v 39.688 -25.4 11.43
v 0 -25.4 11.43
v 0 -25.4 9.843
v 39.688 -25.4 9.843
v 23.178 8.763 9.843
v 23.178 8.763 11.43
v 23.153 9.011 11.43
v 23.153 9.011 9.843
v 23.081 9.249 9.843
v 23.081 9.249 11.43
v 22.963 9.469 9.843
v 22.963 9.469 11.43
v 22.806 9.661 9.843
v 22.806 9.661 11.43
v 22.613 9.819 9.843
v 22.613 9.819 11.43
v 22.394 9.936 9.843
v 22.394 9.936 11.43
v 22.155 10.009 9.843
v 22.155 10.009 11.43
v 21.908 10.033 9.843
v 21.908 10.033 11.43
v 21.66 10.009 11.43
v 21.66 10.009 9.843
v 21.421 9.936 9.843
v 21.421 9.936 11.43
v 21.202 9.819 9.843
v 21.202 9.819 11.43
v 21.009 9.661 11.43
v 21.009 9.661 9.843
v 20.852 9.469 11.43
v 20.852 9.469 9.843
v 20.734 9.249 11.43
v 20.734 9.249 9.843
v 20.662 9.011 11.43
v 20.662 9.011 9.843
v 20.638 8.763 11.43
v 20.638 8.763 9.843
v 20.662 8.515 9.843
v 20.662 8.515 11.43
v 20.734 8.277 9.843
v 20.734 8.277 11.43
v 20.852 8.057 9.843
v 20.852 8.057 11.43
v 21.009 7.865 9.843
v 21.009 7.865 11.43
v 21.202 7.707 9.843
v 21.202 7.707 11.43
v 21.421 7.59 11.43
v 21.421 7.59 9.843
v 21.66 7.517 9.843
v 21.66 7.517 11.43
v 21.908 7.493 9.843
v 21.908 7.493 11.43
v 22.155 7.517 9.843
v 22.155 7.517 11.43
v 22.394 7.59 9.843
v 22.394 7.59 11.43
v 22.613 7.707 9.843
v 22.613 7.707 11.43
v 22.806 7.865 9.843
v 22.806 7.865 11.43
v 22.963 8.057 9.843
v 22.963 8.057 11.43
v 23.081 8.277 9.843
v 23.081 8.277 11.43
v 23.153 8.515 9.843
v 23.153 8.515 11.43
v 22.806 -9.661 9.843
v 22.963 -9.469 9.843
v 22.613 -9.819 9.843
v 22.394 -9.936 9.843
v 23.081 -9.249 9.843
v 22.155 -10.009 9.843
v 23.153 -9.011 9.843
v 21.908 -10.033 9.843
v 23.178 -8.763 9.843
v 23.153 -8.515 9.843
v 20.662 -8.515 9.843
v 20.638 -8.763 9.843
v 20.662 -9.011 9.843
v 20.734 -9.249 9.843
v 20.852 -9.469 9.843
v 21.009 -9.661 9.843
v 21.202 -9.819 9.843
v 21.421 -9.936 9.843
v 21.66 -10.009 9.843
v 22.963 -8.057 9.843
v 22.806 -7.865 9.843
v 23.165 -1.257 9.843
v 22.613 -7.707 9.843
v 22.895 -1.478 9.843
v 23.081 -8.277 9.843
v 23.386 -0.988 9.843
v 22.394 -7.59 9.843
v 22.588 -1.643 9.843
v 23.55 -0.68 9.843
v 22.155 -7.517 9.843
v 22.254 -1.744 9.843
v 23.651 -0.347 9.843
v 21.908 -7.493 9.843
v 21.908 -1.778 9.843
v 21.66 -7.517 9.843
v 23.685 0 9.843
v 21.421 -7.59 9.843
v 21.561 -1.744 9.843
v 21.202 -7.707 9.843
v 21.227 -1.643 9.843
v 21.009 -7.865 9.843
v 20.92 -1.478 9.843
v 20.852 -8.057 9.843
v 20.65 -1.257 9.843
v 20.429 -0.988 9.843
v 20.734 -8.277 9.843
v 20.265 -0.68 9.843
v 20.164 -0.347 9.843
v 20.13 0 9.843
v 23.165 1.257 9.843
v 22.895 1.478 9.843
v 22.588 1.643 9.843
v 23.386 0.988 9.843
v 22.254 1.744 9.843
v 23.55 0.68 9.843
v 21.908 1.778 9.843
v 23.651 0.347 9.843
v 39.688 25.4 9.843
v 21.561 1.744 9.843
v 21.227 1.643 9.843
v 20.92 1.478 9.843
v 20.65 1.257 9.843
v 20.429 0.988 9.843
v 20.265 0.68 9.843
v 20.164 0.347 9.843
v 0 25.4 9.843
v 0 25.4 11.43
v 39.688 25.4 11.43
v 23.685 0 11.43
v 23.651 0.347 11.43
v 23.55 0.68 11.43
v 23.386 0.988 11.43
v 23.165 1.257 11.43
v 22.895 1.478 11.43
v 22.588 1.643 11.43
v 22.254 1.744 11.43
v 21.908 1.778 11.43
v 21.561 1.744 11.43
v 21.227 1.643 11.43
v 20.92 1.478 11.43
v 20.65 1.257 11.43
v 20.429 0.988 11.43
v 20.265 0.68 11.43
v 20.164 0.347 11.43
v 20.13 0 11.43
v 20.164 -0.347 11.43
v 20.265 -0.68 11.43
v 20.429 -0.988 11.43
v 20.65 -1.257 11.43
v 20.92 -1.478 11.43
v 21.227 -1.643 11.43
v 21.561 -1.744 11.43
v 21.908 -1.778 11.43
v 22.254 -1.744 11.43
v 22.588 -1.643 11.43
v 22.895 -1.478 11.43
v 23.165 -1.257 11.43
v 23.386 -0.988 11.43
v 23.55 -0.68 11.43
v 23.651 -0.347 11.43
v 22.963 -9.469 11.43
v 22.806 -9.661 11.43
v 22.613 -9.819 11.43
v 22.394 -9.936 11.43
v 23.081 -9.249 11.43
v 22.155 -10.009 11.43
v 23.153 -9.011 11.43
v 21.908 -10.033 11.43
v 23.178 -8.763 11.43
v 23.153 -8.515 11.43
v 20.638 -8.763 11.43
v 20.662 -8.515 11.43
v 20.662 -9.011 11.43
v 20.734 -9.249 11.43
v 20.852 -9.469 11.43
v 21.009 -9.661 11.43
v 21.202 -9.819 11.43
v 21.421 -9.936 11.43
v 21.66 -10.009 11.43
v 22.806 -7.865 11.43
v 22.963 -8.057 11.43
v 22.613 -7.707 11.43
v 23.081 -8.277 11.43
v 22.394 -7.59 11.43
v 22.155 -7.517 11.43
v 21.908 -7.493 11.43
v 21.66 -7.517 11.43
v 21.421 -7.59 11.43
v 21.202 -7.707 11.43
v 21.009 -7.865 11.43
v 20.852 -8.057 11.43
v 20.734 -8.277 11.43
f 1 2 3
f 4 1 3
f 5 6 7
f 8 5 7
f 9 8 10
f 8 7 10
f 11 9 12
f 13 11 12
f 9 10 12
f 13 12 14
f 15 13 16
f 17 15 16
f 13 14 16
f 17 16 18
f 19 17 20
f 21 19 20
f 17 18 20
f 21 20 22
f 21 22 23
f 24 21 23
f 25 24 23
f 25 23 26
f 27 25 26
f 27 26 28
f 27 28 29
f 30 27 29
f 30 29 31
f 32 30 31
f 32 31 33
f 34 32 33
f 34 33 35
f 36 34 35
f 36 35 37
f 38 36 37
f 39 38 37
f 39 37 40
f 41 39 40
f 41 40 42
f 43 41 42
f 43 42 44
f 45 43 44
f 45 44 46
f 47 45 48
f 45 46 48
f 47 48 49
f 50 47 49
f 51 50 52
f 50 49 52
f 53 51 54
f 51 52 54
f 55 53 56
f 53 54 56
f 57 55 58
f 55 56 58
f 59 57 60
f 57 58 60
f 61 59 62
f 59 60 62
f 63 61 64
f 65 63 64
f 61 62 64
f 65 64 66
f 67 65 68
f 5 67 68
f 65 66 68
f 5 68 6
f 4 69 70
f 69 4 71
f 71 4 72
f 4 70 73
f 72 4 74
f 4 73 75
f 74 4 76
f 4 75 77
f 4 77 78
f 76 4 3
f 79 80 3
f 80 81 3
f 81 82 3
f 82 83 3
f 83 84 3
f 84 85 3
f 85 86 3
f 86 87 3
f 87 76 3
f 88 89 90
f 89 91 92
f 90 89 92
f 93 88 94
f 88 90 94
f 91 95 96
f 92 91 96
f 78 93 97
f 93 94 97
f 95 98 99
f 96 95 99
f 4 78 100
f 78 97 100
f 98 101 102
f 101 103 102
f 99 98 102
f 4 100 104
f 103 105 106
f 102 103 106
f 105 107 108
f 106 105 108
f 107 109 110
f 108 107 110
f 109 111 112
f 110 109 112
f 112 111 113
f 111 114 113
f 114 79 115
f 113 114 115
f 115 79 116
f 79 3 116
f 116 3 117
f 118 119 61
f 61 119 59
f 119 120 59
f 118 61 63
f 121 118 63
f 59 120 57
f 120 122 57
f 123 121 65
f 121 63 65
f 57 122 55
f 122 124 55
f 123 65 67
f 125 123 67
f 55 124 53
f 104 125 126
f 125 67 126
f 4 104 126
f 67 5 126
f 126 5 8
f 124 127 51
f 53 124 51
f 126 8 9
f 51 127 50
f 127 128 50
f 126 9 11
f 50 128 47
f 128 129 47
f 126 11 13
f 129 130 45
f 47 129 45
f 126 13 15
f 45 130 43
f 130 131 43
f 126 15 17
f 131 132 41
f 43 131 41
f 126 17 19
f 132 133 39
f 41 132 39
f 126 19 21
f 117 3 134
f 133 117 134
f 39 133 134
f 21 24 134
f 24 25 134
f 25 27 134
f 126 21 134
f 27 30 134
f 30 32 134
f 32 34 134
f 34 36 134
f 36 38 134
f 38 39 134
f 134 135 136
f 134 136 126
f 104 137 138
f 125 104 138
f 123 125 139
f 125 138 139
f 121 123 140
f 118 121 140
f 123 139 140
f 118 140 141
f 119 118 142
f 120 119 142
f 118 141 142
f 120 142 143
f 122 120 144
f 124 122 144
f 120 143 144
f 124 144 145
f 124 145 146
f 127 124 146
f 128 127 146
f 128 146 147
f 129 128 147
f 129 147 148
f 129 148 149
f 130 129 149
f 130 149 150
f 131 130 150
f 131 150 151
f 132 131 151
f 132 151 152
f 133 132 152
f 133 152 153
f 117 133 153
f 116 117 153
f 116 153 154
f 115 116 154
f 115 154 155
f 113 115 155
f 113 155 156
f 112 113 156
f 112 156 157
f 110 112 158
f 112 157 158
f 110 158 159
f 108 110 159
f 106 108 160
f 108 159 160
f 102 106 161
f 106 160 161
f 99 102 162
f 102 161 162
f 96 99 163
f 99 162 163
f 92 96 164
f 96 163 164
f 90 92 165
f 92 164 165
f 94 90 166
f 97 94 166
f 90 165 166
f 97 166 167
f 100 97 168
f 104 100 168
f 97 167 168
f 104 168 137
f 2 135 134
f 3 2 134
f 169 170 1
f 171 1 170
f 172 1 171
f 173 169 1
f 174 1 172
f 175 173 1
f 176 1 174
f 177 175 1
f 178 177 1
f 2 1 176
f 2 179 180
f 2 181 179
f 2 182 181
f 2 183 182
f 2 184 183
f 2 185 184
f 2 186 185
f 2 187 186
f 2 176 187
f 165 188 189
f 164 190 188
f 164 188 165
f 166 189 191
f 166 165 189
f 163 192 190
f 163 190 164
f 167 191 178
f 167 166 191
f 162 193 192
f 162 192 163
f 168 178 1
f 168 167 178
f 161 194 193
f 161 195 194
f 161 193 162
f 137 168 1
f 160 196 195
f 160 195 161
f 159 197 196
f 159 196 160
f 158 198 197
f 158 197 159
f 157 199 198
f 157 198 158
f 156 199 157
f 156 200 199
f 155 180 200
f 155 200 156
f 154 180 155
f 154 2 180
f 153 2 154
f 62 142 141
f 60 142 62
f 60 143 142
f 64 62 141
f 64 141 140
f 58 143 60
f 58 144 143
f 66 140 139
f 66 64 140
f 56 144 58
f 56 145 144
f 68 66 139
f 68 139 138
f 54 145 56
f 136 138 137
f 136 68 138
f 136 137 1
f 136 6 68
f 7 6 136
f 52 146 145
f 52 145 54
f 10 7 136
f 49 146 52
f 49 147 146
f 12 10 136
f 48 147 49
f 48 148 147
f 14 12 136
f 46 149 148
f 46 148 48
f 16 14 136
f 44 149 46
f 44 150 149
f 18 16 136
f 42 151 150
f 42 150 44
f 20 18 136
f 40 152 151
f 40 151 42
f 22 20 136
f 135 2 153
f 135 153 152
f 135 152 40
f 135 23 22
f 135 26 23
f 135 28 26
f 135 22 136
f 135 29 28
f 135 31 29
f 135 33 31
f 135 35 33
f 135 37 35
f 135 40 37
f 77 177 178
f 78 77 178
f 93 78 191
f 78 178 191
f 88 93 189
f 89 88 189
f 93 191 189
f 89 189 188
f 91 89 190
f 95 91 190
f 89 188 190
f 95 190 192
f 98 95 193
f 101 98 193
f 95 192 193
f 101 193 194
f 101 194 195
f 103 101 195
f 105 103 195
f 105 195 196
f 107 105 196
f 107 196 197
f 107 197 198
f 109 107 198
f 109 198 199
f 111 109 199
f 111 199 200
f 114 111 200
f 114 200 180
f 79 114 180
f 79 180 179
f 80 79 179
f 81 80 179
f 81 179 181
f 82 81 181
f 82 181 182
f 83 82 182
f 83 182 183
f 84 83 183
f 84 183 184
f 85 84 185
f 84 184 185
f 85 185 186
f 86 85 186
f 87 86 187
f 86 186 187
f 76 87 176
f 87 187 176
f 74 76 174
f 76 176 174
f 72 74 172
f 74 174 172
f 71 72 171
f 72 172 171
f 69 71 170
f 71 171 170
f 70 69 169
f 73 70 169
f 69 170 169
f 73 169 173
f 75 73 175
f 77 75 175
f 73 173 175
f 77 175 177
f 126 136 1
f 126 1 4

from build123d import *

# Parameters (mm, degrees)
SKETCH2_W           = 22.86
SKETCH2_H           = 50.8
BOSS_EXTRUDE1_DEPTH = 1.5875
SKETCH3_W           = 1.5875
SKETCH3_H           = 50.8
BOSS_EXTRUDE2_DEPTH = 38.1
CUT_EXTRUDE1_REACH  = 54.372
SKETCH4_R           = 1.778
SKETCH4_R_2         = 1.27


with BuildPart() as part:
    # Sketch2 → Boss-Extrude1 (new body)
    with BuildSketch(Plane(origin=(0, 0, 0), x_dir=(0, 0, -1), z_dir=(1, 0, 0))):
        Rectangle(SKETCH2_W, SKETCH2_H)
    extrude(amount=BOSS_EXTRUDE1_DEPTH)

    # Sketch3 → Boss-Extrude2 (add)
    with BuildSketch(Plane(origin=(1.5875, 0, 0), x_dir=(0, 0, -1), z_dir=(1, 0, 0))):
        with Locations((-10.63625, 0)):
            Rectangle(SKETCH3_W, SKETCH3_H)
    extrude(amount=BOSS_EXTRUDE2_DEPTH)

    # Sketch4 → Cut-Extrude1 (cut, up to next)
    with BuildSketch(Plane.XY.offset(11.43), mode=Mode.PRIVATE) as cut_extrude1_sk1:
        with Locations((21.9075, 0)):
            Circle(SKETCH4_R)
    cut_extrude1_tool1 = extrude(cut_extrude1_sk1.sketch, amount=-CUT_EXTRUDE1_REACH, mode=Mode.PRIVATE) & part.part
    # Sketch4 → Cut-Extrude1 (cut, up to next)
    with BuildSketch(Plane.XY.offset(11.43), mode=Mode.PRIVATE) as cut_extrude1_sk2:
        with Locations((21.9075, 8.763)):
            Circle(SKETCH4_R_2)
    cut_extrude1_tool2 = extrude(cut_extrude1_sk2.sketch, amount=-CUT_EXTRUDE1_REACH, mode=Mode.PRIVATE) & part.part
    # Sketch4 → Cut-Extrude1 (cut, up to next)
    with BuildSketch(Plane.XY.offset(11.43), mode=Mode.PRIVATE) as cut_extrude1_sk3:
        with Locations((21.9075, -8.763)):
            Circle(SKETCH4_R_2)
    cut_extrude1_tool3 = extrude(cut_extrude1_sk3.sketch, amount=-CUT_EXTRUDE1_REACH, mode=Mode.PRIVATE) & part.part
    add(cut_extrude1_tool1.solids().sort_by_distance((21.9075, 0, 11.43))[0], mode=Mode.SUBTRACT)
    add(cut_extrude1_tool2.solids().sort_by_distance((21.9075, 8.763, 11.43))[0], mode=Mode.SUBTRACT)
    add(cut_extrude1_tool3.solids().sort_by_distance((21.9075, -8.763, 11.43))[0], mode=Mode.SUBTRACT)

    # Split1
    split(bisect_by=Plane(origin=(39.6875, -25.4, 9.8425), x_dir=(1, 0, 0), z_dir=(0, 0, 1)), keep=Keep.TOP)


solid = part.part
